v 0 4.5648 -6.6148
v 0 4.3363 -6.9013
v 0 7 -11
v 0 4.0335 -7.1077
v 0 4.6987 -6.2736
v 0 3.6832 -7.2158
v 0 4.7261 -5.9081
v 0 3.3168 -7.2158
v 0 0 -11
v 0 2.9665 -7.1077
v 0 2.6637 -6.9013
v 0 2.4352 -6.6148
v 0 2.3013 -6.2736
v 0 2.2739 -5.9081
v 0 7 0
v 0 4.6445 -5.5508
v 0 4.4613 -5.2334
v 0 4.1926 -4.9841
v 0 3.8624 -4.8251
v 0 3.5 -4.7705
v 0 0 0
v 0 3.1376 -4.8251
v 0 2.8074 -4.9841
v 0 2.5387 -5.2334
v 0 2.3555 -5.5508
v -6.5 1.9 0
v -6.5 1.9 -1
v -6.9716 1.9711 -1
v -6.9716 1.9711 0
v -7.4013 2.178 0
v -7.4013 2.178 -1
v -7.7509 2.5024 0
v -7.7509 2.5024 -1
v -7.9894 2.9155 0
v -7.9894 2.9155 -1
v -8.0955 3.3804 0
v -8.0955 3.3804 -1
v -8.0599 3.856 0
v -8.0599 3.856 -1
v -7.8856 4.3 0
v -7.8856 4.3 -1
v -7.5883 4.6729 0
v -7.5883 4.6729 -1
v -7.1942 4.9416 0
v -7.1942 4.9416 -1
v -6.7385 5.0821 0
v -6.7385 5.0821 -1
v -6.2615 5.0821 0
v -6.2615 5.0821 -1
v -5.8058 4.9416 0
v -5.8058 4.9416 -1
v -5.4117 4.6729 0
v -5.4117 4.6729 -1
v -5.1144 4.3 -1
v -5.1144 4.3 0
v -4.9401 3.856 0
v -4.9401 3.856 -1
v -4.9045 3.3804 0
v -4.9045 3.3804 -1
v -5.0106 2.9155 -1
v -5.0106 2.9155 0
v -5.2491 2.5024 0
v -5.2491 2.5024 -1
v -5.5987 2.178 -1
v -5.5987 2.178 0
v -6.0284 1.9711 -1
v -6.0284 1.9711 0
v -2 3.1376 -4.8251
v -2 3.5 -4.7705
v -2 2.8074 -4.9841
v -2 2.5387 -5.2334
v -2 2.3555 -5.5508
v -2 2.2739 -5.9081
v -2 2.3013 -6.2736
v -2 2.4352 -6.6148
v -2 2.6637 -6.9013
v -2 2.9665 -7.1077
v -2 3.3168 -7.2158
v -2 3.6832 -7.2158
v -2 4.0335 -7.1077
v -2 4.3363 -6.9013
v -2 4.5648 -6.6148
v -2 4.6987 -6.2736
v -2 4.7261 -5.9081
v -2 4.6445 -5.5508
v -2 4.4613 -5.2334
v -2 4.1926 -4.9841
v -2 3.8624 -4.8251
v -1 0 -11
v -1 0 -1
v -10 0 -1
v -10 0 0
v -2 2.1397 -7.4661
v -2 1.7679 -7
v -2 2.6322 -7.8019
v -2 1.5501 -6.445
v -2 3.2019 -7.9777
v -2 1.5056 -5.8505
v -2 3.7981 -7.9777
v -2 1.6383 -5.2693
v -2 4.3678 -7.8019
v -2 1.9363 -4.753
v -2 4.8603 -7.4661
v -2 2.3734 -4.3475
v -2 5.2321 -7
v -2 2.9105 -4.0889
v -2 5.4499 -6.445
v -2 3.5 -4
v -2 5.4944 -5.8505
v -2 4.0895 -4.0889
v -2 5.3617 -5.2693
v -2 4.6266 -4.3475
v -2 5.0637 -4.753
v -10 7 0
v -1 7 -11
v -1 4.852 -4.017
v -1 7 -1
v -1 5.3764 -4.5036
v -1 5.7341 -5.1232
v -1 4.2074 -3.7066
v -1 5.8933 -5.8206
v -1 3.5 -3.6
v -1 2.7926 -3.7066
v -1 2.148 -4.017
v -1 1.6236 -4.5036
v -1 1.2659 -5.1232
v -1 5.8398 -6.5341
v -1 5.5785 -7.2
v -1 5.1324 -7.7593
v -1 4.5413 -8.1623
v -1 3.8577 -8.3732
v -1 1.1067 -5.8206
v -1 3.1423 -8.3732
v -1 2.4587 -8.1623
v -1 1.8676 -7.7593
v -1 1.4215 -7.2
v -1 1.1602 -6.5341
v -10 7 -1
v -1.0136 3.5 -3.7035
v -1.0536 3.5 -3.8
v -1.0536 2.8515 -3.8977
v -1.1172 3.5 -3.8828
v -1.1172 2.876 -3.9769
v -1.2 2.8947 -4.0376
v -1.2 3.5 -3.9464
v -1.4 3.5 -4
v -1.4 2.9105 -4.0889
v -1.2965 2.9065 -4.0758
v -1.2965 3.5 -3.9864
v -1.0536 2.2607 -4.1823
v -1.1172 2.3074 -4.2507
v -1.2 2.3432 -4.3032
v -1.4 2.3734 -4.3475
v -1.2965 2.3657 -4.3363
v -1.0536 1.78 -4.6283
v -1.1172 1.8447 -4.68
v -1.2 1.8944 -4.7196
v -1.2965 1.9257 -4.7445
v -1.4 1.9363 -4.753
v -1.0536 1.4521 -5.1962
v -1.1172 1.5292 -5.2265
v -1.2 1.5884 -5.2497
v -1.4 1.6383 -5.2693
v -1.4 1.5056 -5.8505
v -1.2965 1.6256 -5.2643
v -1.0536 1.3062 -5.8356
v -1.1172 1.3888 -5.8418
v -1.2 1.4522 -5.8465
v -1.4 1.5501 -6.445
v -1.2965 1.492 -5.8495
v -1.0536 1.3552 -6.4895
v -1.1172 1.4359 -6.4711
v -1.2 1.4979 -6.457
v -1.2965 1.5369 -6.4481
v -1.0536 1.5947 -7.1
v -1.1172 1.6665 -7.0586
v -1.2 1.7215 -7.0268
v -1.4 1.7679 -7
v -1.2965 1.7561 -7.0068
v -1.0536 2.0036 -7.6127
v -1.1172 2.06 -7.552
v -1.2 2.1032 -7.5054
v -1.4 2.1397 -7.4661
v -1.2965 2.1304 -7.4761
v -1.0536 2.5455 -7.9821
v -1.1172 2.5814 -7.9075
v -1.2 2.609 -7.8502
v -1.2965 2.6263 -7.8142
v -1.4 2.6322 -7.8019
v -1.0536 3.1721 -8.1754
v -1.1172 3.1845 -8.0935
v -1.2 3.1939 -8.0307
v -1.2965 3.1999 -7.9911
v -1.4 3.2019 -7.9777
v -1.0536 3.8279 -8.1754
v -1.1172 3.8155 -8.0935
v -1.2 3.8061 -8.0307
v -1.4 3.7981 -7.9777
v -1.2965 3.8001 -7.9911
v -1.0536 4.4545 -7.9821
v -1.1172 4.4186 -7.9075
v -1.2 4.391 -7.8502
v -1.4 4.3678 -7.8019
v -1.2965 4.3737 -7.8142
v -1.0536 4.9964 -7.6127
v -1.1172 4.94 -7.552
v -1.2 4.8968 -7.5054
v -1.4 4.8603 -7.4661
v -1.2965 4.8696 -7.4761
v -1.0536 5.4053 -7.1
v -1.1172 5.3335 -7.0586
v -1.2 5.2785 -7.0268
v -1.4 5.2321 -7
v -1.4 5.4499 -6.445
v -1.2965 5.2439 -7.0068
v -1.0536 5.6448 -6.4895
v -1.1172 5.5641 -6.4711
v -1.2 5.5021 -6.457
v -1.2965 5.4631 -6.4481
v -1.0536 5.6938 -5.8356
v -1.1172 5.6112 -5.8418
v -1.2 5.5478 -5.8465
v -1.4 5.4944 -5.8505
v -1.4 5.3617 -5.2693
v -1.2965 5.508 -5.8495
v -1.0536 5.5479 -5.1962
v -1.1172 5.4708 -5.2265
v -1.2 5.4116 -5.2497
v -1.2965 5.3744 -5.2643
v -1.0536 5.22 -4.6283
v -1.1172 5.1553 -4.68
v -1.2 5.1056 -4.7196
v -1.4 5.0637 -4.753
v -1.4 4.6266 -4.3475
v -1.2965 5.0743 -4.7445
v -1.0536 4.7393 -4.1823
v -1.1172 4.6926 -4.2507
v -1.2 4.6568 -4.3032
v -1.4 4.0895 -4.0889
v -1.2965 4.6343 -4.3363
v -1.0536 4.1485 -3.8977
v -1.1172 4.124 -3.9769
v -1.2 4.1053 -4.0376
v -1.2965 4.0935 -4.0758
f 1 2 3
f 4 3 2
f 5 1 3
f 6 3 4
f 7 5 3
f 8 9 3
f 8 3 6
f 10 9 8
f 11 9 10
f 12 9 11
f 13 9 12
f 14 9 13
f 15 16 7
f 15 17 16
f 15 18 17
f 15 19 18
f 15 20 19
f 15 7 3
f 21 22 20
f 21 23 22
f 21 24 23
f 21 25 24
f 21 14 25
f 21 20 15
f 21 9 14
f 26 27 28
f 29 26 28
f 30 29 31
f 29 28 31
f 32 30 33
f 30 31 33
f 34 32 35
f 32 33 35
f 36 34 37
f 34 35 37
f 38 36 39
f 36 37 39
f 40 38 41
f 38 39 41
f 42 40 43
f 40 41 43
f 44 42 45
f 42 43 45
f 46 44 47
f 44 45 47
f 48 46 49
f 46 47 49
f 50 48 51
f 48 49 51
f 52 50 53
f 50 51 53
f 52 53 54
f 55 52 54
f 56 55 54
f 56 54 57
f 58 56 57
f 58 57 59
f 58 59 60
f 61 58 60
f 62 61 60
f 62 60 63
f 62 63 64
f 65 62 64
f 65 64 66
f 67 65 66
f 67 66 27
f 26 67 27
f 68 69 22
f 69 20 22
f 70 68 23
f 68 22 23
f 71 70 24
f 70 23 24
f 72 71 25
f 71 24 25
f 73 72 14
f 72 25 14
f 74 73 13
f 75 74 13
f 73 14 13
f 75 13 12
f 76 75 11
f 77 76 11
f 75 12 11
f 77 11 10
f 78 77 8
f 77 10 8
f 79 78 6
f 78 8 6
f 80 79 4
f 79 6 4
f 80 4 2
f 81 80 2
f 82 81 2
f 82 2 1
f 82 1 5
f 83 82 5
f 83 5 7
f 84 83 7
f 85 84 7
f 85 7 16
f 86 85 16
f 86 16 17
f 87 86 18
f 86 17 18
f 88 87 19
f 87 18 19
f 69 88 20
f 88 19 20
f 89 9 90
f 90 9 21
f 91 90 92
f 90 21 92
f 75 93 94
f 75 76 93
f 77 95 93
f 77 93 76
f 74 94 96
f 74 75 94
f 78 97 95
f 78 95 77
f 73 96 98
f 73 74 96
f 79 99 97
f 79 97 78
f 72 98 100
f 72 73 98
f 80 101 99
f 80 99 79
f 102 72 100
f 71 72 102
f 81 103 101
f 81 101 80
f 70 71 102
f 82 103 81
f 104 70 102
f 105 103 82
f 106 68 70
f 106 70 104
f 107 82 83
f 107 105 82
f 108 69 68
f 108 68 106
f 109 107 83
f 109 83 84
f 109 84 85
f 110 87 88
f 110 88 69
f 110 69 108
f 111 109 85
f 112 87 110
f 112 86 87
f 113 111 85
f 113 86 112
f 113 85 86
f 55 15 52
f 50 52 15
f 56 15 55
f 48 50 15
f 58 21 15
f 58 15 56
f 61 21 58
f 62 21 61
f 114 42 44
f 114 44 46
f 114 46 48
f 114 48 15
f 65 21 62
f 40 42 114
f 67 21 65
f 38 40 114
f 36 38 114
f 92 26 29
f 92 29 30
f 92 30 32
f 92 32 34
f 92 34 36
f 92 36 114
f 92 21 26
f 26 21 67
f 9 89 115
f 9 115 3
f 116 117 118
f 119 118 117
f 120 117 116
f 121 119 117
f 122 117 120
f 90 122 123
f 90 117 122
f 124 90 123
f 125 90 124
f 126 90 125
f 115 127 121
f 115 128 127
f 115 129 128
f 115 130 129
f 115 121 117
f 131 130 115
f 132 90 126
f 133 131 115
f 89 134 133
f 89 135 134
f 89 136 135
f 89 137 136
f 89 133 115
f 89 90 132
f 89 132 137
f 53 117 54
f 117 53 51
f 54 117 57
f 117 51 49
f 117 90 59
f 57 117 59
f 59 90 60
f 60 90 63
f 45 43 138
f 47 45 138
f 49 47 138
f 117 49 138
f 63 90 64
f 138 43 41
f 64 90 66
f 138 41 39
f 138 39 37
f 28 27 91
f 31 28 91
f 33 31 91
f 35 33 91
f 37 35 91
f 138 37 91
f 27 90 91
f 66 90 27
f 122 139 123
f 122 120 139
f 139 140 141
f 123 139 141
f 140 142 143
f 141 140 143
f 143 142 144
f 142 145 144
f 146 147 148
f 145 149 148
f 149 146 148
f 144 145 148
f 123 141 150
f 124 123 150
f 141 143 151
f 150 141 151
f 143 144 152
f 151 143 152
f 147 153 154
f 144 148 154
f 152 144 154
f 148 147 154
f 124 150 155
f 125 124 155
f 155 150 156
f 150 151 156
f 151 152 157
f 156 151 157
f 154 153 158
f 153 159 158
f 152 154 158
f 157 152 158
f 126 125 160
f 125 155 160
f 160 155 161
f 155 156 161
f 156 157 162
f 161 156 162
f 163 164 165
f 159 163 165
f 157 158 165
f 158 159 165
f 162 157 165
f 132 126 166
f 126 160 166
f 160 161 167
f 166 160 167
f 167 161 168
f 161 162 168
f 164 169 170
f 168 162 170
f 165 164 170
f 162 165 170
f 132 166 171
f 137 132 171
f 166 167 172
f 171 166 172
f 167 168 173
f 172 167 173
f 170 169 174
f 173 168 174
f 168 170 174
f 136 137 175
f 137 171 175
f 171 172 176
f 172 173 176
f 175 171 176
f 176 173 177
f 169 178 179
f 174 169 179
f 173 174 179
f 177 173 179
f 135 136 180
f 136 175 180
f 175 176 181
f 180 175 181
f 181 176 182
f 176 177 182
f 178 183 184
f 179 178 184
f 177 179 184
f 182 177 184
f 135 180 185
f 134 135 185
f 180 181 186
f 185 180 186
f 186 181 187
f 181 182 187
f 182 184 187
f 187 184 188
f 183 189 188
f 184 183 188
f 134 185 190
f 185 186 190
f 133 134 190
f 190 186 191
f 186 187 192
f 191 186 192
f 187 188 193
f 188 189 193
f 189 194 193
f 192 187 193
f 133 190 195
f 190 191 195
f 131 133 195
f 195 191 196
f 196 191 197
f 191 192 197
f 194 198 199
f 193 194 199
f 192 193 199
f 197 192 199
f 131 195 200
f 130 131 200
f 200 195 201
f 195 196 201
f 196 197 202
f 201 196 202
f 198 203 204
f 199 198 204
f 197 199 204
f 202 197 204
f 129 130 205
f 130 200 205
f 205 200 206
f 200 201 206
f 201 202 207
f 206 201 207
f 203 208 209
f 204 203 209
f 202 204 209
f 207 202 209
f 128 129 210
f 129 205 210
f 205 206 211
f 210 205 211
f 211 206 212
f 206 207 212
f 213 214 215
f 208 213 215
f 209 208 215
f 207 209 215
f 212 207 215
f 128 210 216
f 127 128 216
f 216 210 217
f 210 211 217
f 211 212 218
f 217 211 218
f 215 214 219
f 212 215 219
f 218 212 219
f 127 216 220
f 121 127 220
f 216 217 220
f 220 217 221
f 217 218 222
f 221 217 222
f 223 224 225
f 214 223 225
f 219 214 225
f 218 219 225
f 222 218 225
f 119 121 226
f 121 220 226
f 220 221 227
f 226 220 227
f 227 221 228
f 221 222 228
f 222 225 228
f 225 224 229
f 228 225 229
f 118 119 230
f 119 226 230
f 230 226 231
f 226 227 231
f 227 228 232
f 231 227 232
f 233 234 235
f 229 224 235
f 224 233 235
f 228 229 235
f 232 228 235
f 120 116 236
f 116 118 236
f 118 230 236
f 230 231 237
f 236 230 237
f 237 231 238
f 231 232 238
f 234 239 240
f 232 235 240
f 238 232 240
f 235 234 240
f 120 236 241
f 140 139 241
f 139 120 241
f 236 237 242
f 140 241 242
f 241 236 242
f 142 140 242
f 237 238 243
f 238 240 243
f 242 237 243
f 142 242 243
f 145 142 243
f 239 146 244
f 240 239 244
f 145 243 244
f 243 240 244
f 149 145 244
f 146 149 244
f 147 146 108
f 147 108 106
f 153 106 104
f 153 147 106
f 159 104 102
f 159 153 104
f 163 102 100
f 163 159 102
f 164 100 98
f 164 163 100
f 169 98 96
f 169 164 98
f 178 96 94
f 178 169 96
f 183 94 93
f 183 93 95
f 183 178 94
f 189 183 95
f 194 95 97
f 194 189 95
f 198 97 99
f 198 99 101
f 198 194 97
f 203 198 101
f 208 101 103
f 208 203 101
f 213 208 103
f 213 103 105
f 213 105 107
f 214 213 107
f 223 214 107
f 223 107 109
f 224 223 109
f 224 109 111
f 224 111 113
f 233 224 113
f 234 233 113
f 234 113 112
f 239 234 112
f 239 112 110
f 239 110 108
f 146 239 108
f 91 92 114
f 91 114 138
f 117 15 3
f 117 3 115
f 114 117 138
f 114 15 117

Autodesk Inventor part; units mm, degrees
ref_plane "YZ Plane" through (0, 0, 0) normal (1, 0, 0) x (0, 1, 0)
ref_plane "XZ Plane" through (0, 0, 0) normal (0, 1, 0) x (-1, 0, 0)
ref_plane "XY Plane" through (0, 0, 0) normal (0, 0, 1) x (1, 0, 0)
sketch "Sketch1" plane through (0, 0, 0) normal (0, 1, 0) x (-1, 0, 0)
  line L0 (1, -11) -> (0, -11)
  line L1 (0, -11) -> (0, 0)
  line L2 (0, 0) -> (10, 0)
  line L3 (10, 0) -> (10, -1)
  line L4 (9, -1) -> (1, -1)
  line L5 (1, -1) -> (1, -10)
  line L6 (1, -10) -> (1, -11)
  line L7 (9, -1) -> (10, -1)
  dimension "d0" = 10
  dimension "d1" = 11
  dimension "d2" = 1
extrude "Extrusion1" add sketch "Sketch1" along normal blind 7
sketch "Sketch2" plane through (-10, 0, 0) normal (0, 0, 1) x (1, 0, 0)
  line L0 (-7.7219, 3.5) -> (14.6275, 3.5)
  line L1 (3.5, 11.0535) -> (3.5, -3.5767)
  line L2 (10, 0) -> (10, 7) projected
  line L3 (0, 0) -> (0, 7) projected
  point P0 (10, 3.5)
  point P1 (3.5, 3.5)
  dimension "d13" = 6.5
hole "Hole1" at (-6.5, 3.5, 0) direction (0, 0, -1) diameter 3.2 end through all clearance for "Flat Head Machine Screw" size "M3" standard "Ansi Metric M Profile"
sketch "Sketch3" plane through (-1, 0, -11) normal (-1, 0, 0) x (0, 0, 1)
  line L0 (5, -6.7291) -> (5, 15.8224)
  line L1 (-2.4783, 3.5) -> (17.6078, 3.5)
  line L2 (0, 0) -> (10, 0) projected
  line L3 (10, 0) -> (10, 7) projected
  line L4 (0, 7) -> (10, 7) projected
  line L5 (0, 0) -> (0, 7) projected
  line L6 (11, 0) -> (11, 7) projected
  circle A0 centre (5, 3.5) radius 2
  point P0 (0, 3.5)
  dimension "d14" = 6
  dimension "d15" = 4
extrude "Extrusion2" add sketch "Sketch3" along normal blind 1 contours A0 L1 L0 | L0 L1 A0 | L1 A0 L0 | L0 A0 L1
fillet "Fillet1" radius 0.4 1 edges at (-1, 3.5, -8)
sketch "Sketch4" plane through (-2, 3.5, -6) normal (-1, 0, 0) x (0, 0, 1)
  point P0 (6, -3.5)
  point P1 (0, 0)
hole "Hole2" at (-2, 3.5, -6) direction (1, 0, 0) diameter 2.459 end through all thread size "M3x0.5" class "6H" standard "ISO Metric profile"
properties part number "Single Thrd Right Support Farnell1466883"
